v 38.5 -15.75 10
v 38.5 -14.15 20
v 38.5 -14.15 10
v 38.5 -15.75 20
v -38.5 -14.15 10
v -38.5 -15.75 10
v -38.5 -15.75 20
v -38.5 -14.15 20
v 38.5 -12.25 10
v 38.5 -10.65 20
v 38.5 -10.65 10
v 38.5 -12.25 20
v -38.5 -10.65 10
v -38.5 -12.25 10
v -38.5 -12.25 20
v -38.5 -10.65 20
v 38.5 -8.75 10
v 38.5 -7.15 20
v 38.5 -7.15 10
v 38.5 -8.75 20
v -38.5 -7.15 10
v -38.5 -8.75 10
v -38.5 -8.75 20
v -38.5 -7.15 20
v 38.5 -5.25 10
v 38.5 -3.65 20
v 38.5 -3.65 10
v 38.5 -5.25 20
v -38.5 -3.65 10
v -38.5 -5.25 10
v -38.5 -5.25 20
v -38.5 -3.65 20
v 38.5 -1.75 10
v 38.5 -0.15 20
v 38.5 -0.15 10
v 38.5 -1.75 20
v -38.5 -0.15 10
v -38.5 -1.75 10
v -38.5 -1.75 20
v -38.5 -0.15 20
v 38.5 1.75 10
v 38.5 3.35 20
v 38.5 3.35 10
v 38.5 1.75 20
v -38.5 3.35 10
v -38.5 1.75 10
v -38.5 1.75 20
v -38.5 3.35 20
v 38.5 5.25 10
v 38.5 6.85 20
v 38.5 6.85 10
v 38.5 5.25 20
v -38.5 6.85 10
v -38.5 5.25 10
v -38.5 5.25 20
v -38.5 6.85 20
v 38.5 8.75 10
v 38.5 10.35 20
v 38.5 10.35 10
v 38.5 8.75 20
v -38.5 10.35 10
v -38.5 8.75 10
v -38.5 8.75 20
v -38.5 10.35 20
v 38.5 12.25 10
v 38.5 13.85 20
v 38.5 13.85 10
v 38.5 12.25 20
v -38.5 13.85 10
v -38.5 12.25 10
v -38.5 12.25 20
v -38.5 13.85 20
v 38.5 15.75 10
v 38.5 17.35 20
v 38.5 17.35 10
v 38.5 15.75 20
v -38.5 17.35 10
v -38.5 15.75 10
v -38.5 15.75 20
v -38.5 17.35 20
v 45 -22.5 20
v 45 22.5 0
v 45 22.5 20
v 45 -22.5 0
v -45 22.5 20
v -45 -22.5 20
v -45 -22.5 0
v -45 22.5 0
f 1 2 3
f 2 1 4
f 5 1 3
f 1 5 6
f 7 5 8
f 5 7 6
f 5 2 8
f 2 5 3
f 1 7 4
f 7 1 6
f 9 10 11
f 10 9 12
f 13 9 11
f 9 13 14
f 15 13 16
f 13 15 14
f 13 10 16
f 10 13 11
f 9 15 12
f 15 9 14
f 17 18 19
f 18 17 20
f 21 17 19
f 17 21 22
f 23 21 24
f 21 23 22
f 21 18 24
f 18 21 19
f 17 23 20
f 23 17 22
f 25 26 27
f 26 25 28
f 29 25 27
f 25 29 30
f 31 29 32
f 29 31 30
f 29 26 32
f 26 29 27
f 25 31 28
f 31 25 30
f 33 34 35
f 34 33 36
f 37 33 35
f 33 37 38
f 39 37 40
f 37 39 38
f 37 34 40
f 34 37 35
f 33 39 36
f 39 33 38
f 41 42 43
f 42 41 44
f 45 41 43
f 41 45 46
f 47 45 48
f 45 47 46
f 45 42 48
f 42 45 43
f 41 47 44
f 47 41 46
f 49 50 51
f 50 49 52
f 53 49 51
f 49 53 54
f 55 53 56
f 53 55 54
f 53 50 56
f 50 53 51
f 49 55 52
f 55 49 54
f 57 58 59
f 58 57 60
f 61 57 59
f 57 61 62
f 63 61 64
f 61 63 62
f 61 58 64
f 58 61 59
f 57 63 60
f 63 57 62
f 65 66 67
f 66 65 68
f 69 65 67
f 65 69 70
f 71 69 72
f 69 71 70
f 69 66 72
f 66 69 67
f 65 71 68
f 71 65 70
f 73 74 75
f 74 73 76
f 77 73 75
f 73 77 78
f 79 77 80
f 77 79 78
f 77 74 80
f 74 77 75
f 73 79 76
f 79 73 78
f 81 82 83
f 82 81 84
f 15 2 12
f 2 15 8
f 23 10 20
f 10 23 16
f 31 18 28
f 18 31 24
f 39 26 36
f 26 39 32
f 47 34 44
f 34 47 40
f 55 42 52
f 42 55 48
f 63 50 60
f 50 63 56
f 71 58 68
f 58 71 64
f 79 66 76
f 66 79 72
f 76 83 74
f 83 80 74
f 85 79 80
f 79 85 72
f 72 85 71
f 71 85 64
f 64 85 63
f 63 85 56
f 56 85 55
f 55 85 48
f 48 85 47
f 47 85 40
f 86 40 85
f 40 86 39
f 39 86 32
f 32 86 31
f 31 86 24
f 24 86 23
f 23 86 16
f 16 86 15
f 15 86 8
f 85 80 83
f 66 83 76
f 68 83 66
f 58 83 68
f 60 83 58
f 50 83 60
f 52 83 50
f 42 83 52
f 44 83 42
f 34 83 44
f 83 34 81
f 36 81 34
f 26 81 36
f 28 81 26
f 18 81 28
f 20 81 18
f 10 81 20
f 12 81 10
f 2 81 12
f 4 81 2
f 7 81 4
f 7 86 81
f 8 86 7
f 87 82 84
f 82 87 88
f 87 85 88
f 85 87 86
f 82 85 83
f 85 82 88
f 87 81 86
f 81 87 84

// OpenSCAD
// Microscope slide drying rack
// 10 slides standing on their long edge, side by side

// ---- Block ----
block_len   = 90;   // X length of base block
block_wid   = 45;   // Y width of base block
block_h     = 20;   // Z height of base block

// ---- Slots ----
slot_count  = 10;   // number of slide slots
slot_len    = 77;   // slot length along X
slot_w      = 1.6;  // slot width along Y
slot_depth  = 10;   // slot depth from top face (Z)
slot_pitch  = 3.5;  // centre-to-centre spacing along Y

// ---- Cut clearance ----
eps         = 0.5;  // overshoot past cut faces

$fn = 64;

difference() {
    // Base block, centred in X/Y, resting on z = 0
    translate([-block_len/2, -block_wid/2, 0])
        cube([block_len, block_wid, block_h]);

    // Slots, centred in X and Y
    for (i = [0 : slot_count - 1]) {
        y = (i - (slot_count - 1)/2) * slot_pitch;
        translate([-slot_len/2, y, block_h - slot_depth])
            cube([slot_len, slot_w, slot_depth + eps]);
    }
}
